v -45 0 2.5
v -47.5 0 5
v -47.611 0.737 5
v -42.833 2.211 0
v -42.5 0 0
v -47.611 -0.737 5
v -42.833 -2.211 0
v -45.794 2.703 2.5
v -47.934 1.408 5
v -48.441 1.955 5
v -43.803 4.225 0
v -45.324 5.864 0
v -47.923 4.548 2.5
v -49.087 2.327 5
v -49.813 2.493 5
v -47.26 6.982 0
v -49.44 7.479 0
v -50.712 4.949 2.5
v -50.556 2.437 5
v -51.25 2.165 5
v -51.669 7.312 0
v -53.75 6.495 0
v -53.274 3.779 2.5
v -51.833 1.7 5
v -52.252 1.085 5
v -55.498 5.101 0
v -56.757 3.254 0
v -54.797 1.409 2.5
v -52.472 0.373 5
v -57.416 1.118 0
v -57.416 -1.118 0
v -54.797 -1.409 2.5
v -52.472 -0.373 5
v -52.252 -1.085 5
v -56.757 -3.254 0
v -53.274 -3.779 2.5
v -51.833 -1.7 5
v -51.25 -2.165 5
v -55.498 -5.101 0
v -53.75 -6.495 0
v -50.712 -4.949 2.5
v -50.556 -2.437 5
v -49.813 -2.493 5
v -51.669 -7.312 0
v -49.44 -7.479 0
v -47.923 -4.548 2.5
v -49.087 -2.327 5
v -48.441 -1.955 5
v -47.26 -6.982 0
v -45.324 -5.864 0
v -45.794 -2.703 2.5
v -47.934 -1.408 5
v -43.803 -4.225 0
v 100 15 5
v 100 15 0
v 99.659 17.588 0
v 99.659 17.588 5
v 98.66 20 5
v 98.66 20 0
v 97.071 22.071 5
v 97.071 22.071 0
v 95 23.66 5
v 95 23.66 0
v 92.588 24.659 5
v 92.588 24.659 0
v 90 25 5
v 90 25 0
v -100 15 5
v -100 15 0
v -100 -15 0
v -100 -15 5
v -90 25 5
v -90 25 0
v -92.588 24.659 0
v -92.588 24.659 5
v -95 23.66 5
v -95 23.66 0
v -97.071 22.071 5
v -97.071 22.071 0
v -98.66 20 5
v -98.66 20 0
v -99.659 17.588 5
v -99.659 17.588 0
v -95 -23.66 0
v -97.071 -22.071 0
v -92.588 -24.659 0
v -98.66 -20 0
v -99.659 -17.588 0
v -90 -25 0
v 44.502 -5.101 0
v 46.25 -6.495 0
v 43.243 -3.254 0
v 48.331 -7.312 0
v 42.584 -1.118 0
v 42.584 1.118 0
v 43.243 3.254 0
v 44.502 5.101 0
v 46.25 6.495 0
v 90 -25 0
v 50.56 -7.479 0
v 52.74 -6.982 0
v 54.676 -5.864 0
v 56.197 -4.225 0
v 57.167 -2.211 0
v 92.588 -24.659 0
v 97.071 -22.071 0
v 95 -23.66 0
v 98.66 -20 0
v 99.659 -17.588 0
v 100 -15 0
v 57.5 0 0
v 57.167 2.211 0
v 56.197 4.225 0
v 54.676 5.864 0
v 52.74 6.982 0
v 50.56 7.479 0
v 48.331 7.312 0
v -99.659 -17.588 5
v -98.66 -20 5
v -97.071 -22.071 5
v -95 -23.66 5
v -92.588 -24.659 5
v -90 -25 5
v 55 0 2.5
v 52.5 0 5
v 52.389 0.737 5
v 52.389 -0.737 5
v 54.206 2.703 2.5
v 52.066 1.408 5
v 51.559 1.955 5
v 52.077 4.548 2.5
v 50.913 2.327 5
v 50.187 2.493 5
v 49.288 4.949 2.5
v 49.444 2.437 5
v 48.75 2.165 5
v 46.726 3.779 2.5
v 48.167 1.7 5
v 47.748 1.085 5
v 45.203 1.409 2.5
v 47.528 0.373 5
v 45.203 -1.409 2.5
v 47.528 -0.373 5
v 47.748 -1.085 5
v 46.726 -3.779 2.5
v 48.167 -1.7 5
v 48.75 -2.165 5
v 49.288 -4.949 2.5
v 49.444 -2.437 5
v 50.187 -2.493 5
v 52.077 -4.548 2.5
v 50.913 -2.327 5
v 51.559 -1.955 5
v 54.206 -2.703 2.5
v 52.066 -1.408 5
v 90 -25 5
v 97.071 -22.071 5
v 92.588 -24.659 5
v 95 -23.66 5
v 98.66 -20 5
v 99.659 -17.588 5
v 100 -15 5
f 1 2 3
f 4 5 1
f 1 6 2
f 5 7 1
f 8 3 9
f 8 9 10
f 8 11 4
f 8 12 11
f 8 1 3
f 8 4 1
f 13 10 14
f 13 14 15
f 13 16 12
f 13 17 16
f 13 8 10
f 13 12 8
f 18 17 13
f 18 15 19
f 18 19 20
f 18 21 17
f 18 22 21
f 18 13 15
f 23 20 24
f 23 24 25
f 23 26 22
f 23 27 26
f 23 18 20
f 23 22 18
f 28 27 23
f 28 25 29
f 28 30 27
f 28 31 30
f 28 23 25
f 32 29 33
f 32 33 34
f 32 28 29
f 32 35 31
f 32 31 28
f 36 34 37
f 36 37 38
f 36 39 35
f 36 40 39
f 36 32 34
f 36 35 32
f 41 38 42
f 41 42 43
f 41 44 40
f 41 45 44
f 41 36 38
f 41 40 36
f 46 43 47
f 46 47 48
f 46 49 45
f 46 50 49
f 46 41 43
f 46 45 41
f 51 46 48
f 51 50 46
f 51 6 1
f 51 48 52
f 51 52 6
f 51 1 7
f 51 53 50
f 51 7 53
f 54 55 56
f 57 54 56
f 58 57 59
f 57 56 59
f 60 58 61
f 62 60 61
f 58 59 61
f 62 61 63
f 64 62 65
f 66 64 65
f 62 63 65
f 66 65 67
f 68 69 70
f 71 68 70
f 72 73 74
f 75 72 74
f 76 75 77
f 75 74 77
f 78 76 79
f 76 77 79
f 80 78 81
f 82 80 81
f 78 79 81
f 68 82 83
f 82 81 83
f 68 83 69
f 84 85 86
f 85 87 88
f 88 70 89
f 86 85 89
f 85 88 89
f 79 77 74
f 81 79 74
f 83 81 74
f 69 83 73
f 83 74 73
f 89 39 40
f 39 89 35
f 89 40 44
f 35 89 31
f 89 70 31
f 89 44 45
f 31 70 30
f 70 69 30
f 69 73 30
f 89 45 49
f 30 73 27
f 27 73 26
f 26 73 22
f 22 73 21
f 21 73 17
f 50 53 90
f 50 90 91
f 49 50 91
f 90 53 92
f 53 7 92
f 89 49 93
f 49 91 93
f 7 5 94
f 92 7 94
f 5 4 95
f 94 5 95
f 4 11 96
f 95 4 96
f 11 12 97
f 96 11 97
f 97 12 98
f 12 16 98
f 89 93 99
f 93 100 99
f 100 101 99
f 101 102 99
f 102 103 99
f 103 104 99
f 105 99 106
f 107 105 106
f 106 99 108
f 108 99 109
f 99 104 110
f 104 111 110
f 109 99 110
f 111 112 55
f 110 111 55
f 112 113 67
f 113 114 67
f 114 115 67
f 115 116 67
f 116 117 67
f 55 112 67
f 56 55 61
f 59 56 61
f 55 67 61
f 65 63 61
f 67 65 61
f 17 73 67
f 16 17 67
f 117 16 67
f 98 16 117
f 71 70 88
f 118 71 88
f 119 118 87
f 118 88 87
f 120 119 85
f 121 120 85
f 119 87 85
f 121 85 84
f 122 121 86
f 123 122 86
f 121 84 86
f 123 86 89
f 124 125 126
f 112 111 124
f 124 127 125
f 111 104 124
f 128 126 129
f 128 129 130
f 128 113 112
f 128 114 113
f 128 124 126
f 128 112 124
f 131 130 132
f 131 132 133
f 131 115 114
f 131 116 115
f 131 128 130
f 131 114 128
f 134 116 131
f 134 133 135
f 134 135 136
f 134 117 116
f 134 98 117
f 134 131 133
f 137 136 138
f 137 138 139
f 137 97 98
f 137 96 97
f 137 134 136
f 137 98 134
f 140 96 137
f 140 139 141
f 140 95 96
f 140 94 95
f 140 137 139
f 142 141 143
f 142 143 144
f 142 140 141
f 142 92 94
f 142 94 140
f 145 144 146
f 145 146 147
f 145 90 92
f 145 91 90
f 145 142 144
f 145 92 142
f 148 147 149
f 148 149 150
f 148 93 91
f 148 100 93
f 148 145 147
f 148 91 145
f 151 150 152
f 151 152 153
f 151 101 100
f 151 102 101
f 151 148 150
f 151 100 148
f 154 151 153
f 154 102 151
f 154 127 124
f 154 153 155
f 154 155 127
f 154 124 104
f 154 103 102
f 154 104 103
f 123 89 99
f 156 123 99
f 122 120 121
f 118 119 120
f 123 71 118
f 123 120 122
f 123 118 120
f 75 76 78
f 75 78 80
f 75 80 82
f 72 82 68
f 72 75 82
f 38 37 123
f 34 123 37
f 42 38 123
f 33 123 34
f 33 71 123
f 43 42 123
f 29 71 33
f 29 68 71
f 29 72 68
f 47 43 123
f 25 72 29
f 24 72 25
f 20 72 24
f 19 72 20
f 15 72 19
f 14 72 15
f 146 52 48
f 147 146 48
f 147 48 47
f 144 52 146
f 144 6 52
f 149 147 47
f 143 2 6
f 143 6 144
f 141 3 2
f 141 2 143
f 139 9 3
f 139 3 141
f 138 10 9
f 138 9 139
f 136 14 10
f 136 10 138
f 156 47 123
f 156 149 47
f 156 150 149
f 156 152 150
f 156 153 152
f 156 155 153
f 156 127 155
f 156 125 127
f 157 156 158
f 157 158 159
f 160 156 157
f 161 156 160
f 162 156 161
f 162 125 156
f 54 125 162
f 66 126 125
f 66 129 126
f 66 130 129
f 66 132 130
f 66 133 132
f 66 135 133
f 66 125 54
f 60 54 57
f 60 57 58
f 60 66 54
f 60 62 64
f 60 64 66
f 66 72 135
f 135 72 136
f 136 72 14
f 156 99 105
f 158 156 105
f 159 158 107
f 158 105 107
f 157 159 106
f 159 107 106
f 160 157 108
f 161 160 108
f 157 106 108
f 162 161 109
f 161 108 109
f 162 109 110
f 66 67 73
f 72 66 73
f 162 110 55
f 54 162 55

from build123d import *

# Parameters (mm, degrees)
F0_R     = 2.5
F1_DEPTH = 5
F2_SIZE  = 4.99999


# Not quite as in the source:
# - a fillet or chamfer is up to 0.001 mm smaller than in the source, because OpenCascade refuses the exact size


with BuildPart() as f1:
    # F0 (on Top) → F1 (new body)
    with BuildSketch(Plane.XY):
        with BuildLine():
            ThreePointArc((100, 15), (97.0710678119, 22.0710678119), (90, 25))
            Line((90, 25), (-90, 25))
            ThreePointArc((-90, 25), (-97.0710678119, 22.0710678119), (-100, 15))
            Line((-100, 15), (-100, -15))
            ThreePointArc((-100, -15), (-97.0710678119, -22.0710678119), (-90, -25))
            Line((-90, -25), (90, -25))
            ThreePointArc((90, -25), (97.0710678119, -22.0710678119), (100, -15))
            Line((100, -15), (100, 15))
        make_face()
        with Locations((-50, 0)):
            Circle(F0_R, mode=Mode.SUBTRACT)
        with Locations((50, 0)):
            Circle(F0_R, mode=Mode.SUBTRACT)
    extrude(amount=F1_DEPTH)

    # F2 (size 5 in the source; OpenCascade refuses exactly that, so slightly less here)
    f2_edges = [f1.edges().sort_by_distance(p)[0] for p in [
        (-52.5, 0, 0),
        (47.5, 0, 0),
    ]]
    chamfer(f2_edges, length=F2_SIZE)


solid = f1.part
